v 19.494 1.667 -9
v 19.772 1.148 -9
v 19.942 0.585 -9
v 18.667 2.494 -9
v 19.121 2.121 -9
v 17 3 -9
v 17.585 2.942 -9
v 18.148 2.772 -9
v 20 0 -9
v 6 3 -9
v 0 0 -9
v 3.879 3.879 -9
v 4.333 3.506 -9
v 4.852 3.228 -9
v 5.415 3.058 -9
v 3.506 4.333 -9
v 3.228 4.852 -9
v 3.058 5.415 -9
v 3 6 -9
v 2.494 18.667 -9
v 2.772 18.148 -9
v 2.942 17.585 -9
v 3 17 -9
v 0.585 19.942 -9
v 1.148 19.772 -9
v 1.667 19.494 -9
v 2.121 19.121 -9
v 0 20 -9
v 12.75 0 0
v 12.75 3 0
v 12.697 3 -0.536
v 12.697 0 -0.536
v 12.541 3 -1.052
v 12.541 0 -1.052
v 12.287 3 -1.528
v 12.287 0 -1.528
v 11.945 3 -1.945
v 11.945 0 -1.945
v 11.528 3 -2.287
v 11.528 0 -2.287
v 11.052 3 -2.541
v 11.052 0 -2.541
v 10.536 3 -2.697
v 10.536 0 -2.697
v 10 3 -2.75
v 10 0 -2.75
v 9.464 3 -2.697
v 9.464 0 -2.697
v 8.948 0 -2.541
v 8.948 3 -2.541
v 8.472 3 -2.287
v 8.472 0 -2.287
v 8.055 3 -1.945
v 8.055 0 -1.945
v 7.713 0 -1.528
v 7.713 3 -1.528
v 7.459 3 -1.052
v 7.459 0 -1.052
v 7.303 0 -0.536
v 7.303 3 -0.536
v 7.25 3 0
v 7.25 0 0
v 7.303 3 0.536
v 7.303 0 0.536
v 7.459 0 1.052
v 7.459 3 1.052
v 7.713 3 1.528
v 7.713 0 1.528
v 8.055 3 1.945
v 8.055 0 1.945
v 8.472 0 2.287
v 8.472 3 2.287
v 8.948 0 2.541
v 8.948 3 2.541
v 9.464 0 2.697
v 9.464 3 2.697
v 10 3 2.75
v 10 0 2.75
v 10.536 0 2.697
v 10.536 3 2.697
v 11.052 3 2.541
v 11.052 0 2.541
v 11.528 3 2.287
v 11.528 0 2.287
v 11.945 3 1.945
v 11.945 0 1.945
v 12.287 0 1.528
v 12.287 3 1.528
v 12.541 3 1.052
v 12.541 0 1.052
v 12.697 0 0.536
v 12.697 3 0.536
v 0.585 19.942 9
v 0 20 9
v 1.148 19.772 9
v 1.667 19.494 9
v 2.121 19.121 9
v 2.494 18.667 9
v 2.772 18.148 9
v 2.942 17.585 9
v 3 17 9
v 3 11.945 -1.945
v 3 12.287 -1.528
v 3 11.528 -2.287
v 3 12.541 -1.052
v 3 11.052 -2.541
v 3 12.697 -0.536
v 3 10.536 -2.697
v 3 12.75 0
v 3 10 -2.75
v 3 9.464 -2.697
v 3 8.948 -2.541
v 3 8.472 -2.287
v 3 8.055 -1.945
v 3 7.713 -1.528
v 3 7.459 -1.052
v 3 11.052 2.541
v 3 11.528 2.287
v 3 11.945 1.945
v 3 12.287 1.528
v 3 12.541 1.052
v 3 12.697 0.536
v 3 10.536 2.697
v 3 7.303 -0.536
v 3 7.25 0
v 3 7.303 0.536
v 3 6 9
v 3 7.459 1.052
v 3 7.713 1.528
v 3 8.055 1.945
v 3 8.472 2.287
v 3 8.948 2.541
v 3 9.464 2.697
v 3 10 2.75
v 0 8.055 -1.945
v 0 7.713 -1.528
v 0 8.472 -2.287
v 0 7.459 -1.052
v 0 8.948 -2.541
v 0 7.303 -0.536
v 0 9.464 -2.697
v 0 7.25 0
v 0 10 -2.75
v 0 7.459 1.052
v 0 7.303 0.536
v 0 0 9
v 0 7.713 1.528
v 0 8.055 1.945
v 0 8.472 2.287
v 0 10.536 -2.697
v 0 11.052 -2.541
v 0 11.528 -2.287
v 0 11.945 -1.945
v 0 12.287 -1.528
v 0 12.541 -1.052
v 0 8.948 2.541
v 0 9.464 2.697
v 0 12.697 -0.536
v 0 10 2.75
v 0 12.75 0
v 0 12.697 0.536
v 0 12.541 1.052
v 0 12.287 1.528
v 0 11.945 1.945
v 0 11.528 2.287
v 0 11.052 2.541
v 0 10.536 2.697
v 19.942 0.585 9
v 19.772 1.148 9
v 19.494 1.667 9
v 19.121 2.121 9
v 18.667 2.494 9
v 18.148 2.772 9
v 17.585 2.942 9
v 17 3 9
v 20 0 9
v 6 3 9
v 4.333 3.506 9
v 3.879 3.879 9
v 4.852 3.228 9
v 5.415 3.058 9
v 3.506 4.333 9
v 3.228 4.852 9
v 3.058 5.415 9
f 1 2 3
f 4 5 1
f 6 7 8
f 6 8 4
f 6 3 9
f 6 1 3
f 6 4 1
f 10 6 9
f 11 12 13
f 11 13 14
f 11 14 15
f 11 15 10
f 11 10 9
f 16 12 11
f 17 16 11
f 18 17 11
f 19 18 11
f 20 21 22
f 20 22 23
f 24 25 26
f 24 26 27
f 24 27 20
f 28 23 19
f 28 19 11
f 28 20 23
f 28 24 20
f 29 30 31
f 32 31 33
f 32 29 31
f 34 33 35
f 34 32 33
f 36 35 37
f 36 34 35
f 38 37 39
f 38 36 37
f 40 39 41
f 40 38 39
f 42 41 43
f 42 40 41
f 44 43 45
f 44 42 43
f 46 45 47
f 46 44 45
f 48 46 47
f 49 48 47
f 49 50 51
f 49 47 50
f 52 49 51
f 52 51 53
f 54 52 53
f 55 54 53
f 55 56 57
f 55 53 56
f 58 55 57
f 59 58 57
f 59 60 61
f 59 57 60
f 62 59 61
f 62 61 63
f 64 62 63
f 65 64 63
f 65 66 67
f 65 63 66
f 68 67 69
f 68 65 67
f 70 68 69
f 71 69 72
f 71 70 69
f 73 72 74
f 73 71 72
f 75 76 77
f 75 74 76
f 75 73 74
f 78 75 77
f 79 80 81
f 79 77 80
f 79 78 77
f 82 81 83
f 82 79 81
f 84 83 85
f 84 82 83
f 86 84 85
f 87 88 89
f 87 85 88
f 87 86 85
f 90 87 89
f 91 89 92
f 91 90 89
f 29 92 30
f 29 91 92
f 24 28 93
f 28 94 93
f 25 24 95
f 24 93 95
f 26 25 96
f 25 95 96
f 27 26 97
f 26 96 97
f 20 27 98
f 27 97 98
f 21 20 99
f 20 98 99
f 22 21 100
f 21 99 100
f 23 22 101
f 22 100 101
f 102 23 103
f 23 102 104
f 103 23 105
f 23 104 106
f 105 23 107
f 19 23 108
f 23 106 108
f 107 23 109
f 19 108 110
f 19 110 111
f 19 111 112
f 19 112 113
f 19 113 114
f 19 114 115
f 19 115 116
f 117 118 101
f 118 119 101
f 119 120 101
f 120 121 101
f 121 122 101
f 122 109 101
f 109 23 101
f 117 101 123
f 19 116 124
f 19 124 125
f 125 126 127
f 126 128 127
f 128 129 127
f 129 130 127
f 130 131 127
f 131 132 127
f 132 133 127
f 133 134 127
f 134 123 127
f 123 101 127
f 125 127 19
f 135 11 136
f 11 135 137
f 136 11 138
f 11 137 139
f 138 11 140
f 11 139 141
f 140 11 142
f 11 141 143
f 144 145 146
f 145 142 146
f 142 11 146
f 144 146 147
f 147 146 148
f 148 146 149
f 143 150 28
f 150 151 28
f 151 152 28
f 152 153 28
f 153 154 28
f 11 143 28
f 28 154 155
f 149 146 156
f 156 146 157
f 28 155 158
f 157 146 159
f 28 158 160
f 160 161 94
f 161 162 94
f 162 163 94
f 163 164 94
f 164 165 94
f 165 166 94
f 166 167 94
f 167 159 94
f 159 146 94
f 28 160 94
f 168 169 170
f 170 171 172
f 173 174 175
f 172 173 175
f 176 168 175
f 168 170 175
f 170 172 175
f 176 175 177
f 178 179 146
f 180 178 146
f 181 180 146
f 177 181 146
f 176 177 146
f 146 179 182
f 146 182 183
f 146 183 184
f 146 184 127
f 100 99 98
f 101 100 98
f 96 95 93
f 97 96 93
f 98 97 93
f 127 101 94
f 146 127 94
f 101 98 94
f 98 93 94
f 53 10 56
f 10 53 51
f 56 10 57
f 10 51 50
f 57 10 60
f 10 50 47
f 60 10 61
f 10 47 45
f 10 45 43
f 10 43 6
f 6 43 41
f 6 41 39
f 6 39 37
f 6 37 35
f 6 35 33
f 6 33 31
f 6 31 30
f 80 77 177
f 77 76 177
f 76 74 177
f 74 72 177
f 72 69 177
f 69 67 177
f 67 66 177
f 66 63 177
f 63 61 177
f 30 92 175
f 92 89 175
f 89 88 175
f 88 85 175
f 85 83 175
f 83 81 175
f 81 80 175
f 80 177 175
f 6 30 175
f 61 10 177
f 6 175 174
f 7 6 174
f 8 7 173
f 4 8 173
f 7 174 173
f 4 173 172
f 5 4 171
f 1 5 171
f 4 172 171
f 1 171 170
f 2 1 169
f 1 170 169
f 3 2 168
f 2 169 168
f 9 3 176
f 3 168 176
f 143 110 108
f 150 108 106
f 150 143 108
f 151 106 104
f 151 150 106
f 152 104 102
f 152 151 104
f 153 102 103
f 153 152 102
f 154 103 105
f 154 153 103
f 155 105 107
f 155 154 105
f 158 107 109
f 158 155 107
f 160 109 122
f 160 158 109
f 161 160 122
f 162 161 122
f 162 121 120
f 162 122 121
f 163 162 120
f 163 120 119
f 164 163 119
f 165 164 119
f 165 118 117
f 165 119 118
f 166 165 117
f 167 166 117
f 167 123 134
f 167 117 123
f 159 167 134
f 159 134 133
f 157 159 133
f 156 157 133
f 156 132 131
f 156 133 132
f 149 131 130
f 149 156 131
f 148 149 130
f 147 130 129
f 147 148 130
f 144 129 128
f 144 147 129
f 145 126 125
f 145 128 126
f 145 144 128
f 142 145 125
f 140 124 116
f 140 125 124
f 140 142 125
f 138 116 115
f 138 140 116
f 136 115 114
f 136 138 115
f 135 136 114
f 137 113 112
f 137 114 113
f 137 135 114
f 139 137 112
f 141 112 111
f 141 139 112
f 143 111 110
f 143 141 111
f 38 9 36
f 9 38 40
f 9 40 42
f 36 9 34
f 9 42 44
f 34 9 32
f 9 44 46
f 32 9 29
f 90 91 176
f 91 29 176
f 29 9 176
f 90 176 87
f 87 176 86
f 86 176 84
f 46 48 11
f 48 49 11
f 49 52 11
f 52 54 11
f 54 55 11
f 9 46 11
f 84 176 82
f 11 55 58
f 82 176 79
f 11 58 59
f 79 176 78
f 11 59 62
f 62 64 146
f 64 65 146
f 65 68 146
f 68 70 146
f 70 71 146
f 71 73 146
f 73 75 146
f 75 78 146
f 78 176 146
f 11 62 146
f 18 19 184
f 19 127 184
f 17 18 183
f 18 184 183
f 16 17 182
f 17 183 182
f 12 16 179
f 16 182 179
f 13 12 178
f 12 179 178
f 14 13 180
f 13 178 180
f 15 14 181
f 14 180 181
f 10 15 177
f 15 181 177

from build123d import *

# Parameters (mm, degrees)
BOSS_EXTRUDE1_DEPTH = 9
SKETCH2_R           = 2.75
CUT_EXTRUDE1_DEPTH  = 21
SKETCH3_R           = 2.75
CUT_EXTRUDE2_DEPTH  = 21


with BuildPart() as part:
    # Sketch1 → Boss-Extrude1 (new body, symmetric)
    with BuildSketch(Plane.XY):
        with BuildLine():
            Line((0, 0), (0, 20))
            ThreePointArc((0, 20), (2.121320344, 19.121320344), (3, 17))
            Line((3, 17), (3, 6))
            ThreePointArc((3, 6), (3.878679656, 3.878679656), (6, 3))
            Line((6, 3), (17, 3))
            ThreePointArc((17, 3), (19.121320344, 2.121320344), (20, 0))
            Line((20, 0), (0, 0))
        make_face()
    extrude(amount=BOSS_EXTRUDE1_DEPTH, both=True)

    # Sketch2 → Cut-Extrude1 (cut, through all)
    with BuildSketch(Plane(origin=(0, 0, 0), x_dir=(1, 0, 0), z_dir=(0, 1, 0))):
        with Locations((10, 0)):
            Circle(SKETCH2_R)
    extrude(amount=CUT_EXTRUDE1_DEPTH, mode=Mode.SUBTRACT)

    # Sketch3 → Cut-Extrude2 (cut, through all)
    with BuildSketch(Plane(origin=(0, 0, 0), x_dir=(0, 0, -1), z_dir=(1, 0, 0))):
        with Locations((0, 10)):
            Circle(SKETCH3_R)
    extrude(amount=CUT_EXTRUDE2_DEPTH, mode=Mode.SUBTRACT)


solid = part.part
